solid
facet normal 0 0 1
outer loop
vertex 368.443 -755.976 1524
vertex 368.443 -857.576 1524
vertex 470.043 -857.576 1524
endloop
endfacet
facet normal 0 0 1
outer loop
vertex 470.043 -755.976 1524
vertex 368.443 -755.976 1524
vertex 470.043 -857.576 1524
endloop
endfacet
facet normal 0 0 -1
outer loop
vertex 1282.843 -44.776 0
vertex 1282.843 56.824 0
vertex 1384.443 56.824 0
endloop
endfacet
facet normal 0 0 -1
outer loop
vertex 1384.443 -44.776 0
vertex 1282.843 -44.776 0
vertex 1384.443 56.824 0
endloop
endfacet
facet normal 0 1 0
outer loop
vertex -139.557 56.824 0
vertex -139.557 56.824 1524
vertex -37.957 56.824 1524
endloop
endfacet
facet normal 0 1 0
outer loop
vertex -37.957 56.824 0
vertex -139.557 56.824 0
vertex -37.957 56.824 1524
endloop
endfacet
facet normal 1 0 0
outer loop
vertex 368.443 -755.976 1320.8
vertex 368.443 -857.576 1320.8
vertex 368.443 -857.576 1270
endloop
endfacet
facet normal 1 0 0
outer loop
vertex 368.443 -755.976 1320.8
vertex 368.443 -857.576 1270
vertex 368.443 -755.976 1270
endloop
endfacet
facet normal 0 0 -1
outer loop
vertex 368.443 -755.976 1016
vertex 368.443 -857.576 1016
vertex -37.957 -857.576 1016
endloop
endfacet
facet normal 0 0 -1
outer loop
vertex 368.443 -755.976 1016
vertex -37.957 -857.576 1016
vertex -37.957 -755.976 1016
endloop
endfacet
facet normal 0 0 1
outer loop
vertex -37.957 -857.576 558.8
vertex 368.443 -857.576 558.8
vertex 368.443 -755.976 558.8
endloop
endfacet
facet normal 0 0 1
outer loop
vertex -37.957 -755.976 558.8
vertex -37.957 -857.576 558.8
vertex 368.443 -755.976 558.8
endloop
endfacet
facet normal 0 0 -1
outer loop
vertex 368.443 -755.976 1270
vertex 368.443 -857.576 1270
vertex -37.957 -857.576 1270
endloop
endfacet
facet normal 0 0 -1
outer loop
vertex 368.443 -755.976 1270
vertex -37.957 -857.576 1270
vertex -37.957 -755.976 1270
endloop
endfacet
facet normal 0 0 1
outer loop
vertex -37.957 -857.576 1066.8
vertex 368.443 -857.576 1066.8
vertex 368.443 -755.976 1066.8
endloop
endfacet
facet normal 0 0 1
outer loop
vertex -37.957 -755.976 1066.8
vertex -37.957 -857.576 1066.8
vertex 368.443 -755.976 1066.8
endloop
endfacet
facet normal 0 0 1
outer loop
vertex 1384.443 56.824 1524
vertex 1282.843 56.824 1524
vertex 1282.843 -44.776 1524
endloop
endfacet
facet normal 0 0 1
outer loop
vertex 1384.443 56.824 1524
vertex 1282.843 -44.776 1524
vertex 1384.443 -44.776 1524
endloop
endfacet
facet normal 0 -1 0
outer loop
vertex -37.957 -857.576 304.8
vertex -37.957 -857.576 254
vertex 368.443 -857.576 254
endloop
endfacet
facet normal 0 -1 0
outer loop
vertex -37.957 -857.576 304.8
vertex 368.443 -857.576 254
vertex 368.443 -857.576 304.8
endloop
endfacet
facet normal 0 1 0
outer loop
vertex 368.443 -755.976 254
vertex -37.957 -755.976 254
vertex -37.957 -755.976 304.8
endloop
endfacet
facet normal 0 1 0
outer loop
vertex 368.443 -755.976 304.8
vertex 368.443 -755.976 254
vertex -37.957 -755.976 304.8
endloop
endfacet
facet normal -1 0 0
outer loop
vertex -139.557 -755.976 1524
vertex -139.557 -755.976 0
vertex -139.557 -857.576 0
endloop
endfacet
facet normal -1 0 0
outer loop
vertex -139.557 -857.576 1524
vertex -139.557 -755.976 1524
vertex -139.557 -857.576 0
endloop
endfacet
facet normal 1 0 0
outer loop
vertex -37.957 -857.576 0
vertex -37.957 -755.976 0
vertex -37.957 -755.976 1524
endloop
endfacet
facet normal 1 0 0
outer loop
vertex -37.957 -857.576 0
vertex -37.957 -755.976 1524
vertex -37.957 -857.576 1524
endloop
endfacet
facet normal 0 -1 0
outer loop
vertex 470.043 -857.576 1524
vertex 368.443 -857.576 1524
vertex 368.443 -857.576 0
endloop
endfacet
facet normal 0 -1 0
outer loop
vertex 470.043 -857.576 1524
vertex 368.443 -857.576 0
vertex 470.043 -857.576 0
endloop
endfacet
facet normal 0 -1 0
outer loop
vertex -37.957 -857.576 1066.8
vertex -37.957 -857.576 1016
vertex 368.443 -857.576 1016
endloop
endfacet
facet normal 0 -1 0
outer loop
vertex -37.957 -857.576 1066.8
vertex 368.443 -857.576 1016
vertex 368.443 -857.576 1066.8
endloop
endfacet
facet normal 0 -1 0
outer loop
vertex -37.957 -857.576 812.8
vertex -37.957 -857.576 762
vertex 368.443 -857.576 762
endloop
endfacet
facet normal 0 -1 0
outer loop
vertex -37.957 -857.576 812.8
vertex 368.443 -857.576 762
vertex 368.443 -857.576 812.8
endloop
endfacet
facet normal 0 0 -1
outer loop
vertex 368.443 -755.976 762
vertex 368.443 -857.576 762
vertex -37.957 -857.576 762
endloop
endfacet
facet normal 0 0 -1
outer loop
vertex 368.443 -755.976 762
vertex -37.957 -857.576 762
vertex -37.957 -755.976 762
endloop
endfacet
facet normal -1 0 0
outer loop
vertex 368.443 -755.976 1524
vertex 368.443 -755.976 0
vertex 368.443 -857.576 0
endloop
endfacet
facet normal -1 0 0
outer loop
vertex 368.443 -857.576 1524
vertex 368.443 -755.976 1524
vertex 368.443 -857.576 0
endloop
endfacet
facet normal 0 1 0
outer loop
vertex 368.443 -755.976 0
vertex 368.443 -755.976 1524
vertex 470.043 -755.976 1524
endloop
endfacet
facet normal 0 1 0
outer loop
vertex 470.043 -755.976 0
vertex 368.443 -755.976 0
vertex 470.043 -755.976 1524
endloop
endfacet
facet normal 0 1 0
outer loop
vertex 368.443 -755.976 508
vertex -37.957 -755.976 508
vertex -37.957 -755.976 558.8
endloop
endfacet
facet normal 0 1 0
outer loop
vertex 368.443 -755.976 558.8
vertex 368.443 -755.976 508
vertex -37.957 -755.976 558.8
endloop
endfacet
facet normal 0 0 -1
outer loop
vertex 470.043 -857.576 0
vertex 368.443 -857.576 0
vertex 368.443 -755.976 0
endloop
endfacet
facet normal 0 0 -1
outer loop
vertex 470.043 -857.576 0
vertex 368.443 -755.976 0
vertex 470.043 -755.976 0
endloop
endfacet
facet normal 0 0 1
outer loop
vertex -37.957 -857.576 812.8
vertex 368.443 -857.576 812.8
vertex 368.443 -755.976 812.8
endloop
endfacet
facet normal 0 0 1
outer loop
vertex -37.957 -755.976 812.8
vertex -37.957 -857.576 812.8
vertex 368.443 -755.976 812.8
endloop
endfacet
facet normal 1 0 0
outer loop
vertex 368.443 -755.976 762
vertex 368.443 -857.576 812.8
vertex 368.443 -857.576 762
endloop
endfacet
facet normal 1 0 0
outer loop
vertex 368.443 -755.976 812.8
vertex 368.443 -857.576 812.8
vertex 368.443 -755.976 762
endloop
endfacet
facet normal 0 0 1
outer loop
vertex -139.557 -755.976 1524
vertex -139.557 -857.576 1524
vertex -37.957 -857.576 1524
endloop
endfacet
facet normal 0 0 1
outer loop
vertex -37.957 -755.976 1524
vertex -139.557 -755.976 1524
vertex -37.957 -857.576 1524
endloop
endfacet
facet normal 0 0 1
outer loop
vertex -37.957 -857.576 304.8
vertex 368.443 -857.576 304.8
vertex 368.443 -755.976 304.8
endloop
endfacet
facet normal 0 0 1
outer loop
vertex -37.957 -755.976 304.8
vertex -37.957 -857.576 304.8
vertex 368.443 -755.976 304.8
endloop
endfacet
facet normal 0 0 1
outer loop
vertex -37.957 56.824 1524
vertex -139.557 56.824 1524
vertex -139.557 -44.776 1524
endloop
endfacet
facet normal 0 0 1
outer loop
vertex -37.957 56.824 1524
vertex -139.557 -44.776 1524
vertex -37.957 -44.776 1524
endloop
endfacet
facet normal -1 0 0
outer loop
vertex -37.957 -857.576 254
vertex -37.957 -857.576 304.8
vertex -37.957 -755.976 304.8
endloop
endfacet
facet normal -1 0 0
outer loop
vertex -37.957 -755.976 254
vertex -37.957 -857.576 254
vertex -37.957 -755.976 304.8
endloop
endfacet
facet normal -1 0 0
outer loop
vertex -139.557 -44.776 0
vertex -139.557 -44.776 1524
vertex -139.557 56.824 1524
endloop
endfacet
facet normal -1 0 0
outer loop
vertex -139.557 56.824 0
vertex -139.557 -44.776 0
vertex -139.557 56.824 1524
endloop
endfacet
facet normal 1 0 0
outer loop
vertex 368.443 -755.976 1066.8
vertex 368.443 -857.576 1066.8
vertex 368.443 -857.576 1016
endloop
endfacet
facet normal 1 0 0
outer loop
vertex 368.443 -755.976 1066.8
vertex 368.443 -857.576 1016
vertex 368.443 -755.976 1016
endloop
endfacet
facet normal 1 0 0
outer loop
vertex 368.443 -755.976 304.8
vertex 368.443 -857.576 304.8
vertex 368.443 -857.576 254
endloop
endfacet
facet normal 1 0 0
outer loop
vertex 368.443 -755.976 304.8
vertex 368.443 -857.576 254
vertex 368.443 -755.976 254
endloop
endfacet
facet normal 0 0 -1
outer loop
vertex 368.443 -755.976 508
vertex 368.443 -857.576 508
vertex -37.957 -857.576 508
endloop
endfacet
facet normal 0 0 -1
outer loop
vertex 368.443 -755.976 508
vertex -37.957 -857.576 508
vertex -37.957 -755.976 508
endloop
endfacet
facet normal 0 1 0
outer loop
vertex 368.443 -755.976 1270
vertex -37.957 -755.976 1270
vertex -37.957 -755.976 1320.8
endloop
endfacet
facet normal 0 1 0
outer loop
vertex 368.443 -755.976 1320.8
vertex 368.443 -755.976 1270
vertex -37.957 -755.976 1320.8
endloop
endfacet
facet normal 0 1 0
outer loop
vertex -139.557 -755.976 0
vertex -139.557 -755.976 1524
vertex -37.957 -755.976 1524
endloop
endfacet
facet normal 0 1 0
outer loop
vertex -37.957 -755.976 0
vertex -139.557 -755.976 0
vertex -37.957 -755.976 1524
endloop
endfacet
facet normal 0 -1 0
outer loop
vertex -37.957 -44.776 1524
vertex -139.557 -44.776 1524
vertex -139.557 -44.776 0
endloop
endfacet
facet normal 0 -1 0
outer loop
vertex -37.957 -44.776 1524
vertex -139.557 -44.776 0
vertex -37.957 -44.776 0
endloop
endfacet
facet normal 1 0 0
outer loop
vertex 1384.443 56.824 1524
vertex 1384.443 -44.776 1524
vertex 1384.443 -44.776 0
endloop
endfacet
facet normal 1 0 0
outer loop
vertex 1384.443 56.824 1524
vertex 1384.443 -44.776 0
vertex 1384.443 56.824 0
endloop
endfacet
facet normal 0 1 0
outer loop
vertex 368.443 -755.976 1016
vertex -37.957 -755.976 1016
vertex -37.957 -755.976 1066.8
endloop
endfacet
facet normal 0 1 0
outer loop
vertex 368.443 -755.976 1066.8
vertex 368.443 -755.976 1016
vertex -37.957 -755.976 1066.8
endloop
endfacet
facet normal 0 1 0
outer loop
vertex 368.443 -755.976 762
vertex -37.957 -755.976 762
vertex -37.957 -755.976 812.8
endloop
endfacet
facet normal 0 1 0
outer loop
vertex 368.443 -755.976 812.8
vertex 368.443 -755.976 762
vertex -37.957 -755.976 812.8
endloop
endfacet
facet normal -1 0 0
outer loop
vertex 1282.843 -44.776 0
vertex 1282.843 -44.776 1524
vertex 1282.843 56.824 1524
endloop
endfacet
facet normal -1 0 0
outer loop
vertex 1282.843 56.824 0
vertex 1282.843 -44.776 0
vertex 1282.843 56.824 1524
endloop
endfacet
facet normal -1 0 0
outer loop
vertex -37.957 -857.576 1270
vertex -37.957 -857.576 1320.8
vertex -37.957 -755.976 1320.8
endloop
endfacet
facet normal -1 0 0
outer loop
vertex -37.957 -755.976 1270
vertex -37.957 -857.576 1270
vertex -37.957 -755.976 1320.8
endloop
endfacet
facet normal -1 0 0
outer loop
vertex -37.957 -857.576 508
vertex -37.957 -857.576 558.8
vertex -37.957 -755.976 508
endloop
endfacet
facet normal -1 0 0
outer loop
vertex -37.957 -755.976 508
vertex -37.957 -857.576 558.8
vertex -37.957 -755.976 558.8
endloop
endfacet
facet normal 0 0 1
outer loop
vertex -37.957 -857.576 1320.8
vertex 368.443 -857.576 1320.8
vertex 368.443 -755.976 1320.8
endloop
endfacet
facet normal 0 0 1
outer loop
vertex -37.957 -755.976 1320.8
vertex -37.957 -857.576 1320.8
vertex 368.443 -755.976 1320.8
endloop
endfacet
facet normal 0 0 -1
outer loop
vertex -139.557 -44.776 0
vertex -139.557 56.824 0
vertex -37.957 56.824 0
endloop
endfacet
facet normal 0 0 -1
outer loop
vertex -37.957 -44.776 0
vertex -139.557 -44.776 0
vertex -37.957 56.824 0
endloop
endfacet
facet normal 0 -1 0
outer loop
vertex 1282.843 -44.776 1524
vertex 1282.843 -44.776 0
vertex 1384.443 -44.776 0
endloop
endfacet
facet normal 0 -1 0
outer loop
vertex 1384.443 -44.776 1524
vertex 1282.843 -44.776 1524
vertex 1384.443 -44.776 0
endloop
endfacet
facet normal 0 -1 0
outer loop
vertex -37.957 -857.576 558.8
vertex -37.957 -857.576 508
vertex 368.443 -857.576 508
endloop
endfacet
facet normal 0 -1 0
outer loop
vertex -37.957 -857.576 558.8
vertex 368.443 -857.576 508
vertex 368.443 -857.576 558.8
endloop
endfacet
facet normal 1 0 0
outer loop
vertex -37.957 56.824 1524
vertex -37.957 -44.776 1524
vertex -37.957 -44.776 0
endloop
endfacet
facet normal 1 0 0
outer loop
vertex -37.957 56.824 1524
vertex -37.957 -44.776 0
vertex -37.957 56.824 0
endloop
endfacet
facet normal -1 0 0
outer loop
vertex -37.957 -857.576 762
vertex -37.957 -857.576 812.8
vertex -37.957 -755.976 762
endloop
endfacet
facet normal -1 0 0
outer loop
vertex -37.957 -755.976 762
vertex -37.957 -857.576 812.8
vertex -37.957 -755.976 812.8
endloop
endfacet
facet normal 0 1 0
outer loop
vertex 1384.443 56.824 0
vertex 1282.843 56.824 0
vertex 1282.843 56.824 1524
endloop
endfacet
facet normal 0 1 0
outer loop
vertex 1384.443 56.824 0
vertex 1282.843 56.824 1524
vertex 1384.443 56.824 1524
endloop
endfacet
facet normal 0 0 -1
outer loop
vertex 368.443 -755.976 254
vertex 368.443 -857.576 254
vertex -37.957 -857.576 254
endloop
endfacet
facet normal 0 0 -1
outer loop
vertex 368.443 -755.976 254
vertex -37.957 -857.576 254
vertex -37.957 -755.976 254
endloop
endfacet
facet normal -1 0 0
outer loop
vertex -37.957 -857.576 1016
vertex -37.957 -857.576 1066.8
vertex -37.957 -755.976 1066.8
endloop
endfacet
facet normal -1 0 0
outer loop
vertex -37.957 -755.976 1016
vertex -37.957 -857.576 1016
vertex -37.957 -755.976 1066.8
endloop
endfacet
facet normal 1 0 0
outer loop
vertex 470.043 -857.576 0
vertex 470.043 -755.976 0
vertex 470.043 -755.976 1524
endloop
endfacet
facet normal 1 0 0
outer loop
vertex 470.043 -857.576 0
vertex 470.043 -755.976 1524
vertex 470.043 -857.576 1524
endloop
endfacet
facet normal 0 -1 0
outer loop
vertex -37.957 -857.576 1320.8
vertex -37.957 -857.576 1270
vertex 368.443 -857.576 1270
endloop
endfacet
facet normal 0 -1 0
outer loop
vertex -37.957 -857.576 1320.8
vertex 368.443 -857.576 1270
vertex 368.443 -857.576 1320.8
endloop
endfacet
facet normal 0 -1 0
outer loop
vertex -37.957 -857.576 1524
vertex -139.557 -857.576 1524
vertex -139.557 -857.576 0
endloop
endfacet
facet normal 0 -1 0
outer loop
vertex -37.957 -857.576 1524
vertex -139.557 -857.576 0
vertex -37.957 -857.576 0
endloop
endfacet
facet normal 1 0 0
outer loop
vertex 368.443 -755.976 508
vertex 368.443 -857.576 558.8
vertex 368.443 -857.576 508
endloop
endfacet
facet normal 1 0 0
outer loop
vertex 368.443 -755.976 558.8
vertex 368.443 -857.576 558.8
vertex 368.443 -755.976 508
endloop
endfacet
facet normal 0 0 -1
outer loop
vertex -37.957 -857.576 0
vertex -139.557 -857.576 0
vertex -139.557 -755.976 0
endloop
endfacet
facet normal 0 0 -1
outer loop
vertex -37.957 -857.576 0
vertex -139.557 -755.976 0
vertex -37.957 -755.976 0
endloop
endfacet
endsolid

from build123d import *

# Parameters (mm, degrees)
F0_W     = 101.6
F0_H     = 101.6
F1_DEPTH = 1524
F2_W     = 101.6
F2_H     = 101.6
F3_DEPTH = 1524
F4_W     = 101.6
F4_H     = 101.6
F5_DEPTH = 1524
F6_W     = 101.6
F6_H     = 50.8
F7_DEPTH = 406.4
F8_W     = 101.6
F8_H     = 101.6
F9_DEPTH = 1524


with BuildPart() as f1:
    # F0 (on Top) → F1 (new body)
    with BuildSketch(Plane.XY):
        with Locations((-88.756926, 6.02414)):
            Rectangle(F0_W, F0_H)
    extrude(amount=F1_DEPTH)


with BuildPart() as f3:
    # F2 (on face) → F3 (new body)
    with BuildSketch(Plane(origin=(0, 0, 0), x_dir=(1, 0, 0), z_dir=(0, 0, -1))):
        with Locations((-88.756926, 806.77586)):
            Rectangle(F2_W, F2_H)
    extrude(amount=-F3_DEPTH)


with BuildPart() as f5:
    # F4 (on face) → F5 (new body)
    with BuildSketch(Plane(origin=(0, 0, 0), x_dir=(1, 0, 0), z_dir=(0, 0, -1))):
        with Locations((419.243074, 806.77586)):
            Rectangle(F4_W, F4_H)
    extrude(amount=-F5_DEPTH)


with BuildPart() as f7:
    # F6 (on face) → F7 (new body, through all)
    with BuildSketch(Plane.YZ.offset(-37.956926)):
        with Locations((-806.77586, 279.4)):
            Rectangle(F6_W, F6_H)
        with Locations((-806.77586, 533.4)):
            Rectangle(F6_W, F6_H)
        with Locations((-806.77586, 787.4)):
            Rectangle(F6_W, F6_H)
        with Locations((-806.77586, 1041.4)):
            Rectangle(F6_W, F6_H)
        with Locations((-806.77586, 1295.4)):
            Rectangle(F6_W, F6_H)
    extrude(amount=F7_DEPTH)


with BuildPart() as f9:
    # F8 (on Top) → F9 (new body)
    with BuildSketch(Plane.XY):
        with Locations((1333.643074, 6.02414)):
            Rectangle(F8_W, F8_H)
    extrude(amount=F9_DEPTH)


solid = Compound([f1.part, f3.part, f5.part, f7.part, f9.part])
